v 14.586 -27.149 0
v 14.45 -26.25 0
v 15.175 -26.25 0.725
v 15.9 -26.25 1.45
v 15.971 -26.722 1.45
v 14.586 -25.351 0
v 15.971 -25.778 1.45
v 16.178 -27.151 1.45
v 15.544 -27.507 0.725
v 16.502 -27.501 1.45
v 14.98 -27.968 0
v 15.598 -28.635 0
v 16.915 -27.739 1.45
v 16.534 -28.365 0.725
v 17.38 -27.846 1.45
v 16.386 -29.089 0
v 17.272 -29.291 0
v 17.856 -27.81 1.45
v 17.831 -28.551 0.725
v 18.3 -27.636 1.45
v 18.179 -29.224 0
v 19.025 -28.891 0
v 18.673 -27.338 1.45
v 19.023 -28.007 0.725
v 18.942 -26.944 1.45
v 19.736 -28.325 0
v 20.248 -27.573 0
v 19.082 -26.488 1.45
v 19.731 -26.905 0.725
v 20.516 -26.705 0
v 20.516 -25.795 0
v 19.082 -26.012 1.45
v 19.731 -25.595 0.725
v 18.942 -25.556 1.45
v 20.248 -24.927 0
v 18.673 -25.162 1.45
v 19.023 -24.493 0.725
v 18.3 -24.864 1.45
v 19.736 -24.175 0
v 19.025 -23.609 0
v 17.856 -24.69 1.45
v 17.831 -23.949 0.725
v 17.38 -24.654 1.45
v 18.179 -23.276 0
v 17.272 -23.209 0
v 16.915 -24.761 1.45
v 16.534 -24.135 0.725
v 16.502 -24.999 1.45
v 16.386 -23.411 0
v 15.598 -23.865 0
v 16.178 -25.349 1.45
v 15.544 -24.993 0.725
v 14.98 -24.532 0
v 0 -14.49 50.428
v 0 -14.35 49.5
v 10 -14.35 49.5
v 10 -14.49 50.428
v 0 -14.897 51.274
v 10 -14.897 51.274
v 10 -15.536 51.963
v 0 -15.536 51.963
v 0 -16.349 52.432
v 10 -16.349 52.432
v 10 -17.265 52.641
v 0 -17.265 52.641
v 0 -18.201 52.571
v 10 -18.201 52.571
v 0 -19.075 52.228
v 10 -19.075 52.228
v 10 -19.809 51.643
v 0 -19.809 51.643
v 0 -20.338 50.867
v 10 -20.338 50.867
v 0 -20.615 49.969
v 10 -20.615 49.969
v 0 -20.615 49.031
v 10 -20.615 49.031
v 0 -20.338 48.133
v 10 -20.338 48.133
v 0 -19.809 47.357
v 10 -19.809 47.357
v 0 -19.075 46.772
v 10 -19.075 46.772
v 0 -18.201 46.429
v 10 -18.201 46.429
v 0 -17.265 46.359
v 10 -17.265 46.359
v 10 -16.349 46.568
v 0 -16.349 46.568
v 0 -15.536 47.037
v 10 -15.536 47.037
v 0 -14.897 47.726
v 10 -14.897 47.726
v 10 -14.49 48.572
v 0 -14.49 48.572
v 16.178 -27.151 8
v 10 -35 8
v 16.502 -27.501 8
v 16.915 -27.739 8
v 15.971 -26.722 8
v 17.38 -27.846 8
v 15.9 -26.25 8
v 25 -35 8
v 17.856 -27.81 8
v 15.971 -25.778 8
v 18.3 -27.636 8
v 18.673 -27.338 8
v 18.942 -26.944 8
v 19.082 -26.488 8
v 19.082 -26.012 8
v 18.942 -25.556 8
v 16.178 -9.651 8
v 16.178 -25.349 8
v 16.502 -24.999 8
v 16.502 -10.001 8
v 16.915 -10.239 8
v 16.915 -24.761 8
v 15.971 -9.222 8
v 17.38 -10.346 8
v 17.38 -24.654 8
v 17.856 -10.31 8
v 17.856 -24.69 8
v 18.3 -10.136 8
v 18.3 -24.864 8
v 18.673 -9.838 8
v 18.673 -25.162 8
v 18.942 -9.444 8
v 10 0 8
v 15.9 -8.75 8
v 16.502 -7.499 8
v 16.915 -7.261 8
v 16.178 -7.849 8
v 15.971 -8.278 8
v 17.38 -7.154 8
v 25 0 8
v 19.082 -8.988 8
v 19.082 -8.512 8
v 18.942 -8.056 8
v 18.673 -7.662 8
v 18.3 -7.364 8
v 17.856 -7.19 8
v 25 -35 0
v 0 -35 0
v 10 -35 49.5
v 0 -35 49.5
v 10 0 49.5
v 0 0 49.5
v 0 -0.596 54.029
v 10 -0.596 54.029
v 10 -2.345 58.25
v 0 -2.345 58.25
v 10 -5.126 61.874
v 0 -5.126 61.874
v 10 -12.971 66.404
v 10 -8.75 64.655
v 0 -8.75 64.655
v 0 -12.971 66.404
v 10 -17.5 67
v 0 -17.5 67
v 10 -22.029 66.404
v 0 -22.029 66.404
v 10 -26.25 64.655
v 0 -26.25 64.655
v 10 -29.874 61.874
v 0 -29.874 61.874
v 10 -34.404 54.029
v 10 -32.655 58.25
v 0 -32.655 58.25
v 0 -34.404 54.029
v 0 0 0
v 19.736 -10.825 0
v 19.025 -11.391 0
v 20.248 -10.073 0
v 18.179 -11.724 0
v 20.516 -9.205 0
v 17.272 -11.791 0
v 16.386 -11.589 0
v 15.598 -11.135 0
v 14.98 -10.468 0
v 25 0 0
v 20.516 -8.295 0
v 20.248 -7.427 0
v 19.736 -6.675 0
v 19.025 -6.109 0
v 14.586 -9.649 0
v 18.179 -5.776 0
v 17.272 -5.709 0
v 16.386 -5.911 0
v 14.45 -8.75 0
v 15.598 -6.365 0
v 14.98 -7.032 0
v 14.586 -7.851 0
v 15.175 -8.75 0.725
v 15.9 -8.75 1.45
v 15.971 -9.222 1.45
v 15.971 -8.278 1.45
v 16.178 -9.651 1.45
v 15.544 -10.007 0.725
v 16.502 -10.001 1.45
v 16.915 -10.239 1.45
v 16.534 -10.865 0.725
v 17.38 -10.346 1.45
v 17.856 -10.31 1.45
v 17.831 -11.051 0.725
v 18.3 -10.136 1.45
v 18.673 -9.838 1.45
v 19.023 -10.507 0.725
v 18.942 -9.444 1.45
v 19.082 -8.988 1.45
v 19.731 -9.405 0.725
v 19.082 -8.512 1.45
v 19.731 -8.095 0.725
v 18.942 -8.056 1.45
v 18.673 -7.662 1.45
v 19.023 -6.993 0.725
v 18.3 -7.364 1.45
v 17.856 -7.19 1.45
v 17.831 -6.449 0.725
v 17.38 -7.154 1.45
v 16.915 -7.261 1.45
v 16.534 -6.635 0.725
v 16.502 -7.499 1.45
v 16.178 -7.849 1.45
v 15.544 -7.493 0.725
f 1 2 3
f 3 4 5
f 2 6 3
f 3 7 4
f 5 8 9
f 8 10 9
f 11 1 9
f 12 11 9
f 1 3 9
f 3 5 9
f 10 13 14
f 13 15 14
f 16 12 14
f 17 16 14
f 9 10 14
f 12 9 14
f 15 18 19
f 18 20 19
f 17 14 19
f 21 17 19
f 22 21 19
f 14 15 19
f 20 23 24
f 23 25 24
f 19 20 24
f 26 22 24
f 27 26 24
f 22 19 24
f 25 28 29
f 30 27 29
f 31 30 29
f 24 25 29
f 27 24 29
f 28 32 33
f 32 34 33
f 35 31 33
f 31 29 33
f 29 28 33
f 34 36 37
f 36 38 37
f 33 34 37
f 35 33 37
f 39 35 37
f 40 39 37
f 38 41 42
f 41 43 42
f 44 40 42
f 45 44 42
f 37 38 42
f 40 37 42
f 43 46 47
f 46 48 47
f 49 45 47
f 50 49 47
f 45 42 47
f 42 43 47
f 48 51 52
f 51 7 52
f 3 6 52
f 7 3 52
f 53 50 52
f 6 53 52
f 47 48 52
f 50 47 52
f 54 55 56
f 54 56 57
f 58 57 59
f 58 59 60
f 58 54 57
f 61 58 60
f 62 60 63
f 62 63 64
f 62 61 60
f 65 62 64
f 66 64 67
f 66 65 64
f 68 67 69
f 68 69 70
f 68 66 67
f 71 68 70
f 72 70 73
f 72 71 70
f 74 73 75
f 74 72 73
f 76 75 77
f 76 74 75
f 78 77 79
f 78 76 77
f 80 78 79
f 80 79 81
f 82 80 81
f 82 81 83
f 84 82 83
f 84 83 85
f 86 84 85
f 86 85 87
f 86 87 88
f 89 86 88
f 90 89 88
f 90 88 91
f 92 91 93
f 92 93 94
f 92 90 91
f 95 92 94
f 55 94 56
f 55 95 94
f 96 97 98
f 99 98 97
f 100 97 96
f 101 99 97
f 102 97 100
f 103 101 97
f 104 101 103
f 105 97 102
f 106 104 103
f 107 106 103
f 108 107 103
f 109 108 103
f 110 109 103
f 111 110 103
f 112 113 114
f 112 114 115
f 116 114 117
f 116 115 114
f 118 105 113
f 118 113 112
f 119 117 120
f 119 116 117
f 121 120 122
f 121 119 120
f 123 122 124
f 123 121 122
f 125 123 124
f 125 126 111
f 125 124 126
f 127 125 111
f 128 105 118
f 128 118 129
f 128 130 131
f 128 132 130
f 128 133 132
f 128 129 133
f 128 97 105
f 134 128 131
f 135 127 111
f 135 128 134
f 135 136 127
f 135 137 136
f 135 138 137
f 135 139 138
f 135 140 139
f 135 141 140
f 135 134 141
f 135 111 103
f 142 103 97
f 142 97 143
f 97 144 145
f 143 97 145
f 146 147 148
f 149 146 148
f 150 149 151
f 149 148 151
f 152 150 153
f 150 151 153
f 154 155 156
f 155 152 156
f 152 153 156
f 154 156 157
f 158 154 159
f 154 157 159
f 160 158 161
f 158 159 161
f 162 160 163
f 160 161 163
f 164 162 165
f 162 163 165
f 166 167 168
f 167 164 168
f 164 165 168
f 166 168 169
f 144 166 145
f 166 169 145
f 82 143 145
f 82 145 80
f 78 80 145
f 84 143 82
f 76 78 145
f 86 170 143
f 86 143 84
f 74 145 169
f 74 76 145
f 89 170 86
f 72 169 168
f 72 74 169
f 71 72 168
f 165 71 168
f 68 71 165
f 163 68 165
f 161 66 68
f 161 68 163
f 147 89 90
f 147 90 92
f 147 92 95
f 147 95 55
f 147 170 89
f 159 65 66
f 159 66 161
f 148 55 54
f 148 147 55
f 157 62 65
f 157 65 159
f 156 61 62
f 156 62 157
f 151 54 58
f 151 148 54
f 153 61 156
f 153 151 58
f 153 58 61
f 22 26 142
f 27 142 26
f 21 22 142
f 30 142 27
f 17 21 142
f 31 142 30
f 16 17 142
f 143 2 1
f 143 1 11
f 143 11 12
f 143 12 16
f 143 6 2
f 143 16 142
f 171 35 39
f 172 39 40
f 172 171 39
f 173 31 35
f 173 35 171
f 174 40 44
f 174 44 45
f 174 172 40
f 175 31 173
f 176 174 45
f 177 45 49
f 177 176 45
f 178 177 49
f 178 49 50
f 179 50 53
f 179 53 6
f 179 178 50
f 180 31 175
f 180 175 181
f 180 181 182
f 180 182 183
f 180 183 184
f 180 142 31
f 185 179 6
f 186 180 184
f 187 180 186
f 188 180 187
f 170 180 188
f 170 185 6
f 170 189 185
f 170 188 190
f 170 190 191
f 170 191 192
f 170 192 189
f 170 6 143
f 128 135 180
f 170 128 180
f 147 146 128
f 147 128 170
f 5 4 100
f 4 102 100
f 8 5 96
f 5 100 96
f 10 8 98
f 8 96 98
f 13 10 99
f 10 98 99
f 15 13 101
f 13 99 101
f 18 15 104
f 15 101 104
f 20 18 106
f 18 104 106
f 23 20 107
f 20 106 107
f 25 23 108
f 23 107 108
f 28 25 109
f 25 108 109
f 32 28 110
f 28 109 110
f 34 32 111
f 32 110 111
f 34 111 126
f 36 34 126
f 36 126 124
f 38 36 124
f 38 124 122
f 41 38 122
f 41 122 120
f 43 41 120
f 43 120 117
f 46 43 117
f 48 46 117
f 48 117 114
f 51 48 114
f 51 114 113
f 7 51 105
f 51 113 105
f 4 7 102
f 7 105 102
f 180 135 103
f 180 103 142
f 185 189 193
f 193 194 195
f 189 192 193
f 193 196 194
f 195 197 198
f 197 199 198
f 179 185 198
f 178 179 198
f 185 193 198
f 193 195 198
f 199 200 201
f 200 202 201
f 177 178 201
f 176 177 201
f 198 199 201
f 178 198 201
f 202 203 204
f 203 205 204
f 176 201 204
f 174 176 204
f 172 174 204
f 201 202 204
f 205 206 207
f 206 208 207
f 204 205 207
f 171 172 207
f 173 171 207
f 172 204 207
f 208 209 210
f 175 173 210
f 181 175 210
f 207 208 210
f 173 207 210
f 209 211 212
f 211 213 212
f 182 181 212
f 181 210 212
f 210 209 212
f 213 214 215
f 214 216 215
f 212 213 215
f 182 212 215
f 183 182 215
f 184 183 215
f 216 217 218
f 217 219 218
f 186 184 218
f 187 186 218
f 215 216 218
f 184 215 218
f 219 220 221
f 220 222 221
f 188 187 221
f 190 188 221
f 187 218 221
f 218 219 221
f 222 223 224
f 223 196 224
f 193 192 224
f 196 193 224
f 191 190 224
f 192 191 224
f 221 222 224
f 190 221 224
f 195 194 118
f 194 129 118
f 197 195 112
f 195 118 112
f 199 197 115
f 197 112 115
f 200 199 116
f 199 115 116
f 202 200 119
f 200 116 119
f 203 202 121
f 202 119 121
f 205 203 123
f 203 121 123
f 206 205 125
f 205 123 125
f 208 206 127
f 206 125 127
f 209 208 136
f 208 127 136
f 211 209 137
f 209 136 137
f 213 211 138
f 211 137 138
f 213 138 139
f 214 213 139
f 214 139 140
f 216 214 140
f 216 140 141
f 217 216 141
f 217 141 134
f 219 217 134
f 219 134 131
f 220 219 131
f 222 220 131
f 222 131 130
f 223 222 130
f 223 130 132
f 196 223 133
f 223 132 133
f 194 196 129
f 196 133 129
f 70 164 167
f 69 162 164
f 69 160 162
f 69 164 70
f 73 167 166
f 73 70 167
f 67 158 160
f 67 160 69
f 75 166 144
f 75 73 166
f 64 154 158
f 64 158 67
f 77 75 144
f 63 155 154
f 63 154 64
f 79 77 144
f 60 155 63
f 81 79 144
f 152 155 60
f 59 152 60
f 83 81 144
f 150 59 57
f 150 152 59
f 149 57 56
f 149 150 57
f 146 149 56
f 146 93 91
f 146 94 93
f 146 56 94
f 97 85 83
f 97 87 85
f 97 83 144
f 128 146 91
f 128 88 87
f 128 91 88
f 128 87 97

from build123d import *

# Parameters (mm, degrees)
PAD_DEPTH        = 35
SKETCH001_R      = 3.15
POCKET_DEPTH     = 10
HOLE_D           = 3.2
HOLE_CSINK_D     = 6.1
HOLE_CSINK_ANGLE = 90


with BuildPart() as part:
    # Sketch → Pad (new body)
    with BuildSketch(Plane.XZ):
        Polygon((0, 0), (0, 67), (10, 67), (10, 8), (25, 8), (25, 0), align=None)
    extrude(amount=PAD_DEPTH)

    # Sketch001 → Pocket (cut)
    with BuildSketch(Plane.YZ):
        with Locations((-17.5, 49.5)):
            Circle(SKETCH001_R)
        with BuildLine():
            ThreePointArc((0, 49.5), (-17.5, 67), (-35, 49.5))
            Line((-35, 49.5), (-45, 49.5))
            Line((-45, 49.5), (-45, 74.5))
            Line((-45, 74.5), (10, 74.5))
            Line((10, 74.5), (10, 49.5))
            Line((10, 49.5), (0, 49.5))
        make_face()
    extrude(amount=POCKET_DEPTH, mode=Mode.SUBTRACT)

    # Hole (through all)
    with Locations(Plane(origin=(0, 0, 0), x_dir=(1, 0, 0), z_dir=(0, 0, -1))):
        with Locations((17.5, 8.75), (17.5, 26.25)):
            CounterSinkHole(HOLE_D / 2, HOLE_CSINK_D / 2, counter_sink_angle=HOLE_CSINK_ANGLE)


solid = part.part
